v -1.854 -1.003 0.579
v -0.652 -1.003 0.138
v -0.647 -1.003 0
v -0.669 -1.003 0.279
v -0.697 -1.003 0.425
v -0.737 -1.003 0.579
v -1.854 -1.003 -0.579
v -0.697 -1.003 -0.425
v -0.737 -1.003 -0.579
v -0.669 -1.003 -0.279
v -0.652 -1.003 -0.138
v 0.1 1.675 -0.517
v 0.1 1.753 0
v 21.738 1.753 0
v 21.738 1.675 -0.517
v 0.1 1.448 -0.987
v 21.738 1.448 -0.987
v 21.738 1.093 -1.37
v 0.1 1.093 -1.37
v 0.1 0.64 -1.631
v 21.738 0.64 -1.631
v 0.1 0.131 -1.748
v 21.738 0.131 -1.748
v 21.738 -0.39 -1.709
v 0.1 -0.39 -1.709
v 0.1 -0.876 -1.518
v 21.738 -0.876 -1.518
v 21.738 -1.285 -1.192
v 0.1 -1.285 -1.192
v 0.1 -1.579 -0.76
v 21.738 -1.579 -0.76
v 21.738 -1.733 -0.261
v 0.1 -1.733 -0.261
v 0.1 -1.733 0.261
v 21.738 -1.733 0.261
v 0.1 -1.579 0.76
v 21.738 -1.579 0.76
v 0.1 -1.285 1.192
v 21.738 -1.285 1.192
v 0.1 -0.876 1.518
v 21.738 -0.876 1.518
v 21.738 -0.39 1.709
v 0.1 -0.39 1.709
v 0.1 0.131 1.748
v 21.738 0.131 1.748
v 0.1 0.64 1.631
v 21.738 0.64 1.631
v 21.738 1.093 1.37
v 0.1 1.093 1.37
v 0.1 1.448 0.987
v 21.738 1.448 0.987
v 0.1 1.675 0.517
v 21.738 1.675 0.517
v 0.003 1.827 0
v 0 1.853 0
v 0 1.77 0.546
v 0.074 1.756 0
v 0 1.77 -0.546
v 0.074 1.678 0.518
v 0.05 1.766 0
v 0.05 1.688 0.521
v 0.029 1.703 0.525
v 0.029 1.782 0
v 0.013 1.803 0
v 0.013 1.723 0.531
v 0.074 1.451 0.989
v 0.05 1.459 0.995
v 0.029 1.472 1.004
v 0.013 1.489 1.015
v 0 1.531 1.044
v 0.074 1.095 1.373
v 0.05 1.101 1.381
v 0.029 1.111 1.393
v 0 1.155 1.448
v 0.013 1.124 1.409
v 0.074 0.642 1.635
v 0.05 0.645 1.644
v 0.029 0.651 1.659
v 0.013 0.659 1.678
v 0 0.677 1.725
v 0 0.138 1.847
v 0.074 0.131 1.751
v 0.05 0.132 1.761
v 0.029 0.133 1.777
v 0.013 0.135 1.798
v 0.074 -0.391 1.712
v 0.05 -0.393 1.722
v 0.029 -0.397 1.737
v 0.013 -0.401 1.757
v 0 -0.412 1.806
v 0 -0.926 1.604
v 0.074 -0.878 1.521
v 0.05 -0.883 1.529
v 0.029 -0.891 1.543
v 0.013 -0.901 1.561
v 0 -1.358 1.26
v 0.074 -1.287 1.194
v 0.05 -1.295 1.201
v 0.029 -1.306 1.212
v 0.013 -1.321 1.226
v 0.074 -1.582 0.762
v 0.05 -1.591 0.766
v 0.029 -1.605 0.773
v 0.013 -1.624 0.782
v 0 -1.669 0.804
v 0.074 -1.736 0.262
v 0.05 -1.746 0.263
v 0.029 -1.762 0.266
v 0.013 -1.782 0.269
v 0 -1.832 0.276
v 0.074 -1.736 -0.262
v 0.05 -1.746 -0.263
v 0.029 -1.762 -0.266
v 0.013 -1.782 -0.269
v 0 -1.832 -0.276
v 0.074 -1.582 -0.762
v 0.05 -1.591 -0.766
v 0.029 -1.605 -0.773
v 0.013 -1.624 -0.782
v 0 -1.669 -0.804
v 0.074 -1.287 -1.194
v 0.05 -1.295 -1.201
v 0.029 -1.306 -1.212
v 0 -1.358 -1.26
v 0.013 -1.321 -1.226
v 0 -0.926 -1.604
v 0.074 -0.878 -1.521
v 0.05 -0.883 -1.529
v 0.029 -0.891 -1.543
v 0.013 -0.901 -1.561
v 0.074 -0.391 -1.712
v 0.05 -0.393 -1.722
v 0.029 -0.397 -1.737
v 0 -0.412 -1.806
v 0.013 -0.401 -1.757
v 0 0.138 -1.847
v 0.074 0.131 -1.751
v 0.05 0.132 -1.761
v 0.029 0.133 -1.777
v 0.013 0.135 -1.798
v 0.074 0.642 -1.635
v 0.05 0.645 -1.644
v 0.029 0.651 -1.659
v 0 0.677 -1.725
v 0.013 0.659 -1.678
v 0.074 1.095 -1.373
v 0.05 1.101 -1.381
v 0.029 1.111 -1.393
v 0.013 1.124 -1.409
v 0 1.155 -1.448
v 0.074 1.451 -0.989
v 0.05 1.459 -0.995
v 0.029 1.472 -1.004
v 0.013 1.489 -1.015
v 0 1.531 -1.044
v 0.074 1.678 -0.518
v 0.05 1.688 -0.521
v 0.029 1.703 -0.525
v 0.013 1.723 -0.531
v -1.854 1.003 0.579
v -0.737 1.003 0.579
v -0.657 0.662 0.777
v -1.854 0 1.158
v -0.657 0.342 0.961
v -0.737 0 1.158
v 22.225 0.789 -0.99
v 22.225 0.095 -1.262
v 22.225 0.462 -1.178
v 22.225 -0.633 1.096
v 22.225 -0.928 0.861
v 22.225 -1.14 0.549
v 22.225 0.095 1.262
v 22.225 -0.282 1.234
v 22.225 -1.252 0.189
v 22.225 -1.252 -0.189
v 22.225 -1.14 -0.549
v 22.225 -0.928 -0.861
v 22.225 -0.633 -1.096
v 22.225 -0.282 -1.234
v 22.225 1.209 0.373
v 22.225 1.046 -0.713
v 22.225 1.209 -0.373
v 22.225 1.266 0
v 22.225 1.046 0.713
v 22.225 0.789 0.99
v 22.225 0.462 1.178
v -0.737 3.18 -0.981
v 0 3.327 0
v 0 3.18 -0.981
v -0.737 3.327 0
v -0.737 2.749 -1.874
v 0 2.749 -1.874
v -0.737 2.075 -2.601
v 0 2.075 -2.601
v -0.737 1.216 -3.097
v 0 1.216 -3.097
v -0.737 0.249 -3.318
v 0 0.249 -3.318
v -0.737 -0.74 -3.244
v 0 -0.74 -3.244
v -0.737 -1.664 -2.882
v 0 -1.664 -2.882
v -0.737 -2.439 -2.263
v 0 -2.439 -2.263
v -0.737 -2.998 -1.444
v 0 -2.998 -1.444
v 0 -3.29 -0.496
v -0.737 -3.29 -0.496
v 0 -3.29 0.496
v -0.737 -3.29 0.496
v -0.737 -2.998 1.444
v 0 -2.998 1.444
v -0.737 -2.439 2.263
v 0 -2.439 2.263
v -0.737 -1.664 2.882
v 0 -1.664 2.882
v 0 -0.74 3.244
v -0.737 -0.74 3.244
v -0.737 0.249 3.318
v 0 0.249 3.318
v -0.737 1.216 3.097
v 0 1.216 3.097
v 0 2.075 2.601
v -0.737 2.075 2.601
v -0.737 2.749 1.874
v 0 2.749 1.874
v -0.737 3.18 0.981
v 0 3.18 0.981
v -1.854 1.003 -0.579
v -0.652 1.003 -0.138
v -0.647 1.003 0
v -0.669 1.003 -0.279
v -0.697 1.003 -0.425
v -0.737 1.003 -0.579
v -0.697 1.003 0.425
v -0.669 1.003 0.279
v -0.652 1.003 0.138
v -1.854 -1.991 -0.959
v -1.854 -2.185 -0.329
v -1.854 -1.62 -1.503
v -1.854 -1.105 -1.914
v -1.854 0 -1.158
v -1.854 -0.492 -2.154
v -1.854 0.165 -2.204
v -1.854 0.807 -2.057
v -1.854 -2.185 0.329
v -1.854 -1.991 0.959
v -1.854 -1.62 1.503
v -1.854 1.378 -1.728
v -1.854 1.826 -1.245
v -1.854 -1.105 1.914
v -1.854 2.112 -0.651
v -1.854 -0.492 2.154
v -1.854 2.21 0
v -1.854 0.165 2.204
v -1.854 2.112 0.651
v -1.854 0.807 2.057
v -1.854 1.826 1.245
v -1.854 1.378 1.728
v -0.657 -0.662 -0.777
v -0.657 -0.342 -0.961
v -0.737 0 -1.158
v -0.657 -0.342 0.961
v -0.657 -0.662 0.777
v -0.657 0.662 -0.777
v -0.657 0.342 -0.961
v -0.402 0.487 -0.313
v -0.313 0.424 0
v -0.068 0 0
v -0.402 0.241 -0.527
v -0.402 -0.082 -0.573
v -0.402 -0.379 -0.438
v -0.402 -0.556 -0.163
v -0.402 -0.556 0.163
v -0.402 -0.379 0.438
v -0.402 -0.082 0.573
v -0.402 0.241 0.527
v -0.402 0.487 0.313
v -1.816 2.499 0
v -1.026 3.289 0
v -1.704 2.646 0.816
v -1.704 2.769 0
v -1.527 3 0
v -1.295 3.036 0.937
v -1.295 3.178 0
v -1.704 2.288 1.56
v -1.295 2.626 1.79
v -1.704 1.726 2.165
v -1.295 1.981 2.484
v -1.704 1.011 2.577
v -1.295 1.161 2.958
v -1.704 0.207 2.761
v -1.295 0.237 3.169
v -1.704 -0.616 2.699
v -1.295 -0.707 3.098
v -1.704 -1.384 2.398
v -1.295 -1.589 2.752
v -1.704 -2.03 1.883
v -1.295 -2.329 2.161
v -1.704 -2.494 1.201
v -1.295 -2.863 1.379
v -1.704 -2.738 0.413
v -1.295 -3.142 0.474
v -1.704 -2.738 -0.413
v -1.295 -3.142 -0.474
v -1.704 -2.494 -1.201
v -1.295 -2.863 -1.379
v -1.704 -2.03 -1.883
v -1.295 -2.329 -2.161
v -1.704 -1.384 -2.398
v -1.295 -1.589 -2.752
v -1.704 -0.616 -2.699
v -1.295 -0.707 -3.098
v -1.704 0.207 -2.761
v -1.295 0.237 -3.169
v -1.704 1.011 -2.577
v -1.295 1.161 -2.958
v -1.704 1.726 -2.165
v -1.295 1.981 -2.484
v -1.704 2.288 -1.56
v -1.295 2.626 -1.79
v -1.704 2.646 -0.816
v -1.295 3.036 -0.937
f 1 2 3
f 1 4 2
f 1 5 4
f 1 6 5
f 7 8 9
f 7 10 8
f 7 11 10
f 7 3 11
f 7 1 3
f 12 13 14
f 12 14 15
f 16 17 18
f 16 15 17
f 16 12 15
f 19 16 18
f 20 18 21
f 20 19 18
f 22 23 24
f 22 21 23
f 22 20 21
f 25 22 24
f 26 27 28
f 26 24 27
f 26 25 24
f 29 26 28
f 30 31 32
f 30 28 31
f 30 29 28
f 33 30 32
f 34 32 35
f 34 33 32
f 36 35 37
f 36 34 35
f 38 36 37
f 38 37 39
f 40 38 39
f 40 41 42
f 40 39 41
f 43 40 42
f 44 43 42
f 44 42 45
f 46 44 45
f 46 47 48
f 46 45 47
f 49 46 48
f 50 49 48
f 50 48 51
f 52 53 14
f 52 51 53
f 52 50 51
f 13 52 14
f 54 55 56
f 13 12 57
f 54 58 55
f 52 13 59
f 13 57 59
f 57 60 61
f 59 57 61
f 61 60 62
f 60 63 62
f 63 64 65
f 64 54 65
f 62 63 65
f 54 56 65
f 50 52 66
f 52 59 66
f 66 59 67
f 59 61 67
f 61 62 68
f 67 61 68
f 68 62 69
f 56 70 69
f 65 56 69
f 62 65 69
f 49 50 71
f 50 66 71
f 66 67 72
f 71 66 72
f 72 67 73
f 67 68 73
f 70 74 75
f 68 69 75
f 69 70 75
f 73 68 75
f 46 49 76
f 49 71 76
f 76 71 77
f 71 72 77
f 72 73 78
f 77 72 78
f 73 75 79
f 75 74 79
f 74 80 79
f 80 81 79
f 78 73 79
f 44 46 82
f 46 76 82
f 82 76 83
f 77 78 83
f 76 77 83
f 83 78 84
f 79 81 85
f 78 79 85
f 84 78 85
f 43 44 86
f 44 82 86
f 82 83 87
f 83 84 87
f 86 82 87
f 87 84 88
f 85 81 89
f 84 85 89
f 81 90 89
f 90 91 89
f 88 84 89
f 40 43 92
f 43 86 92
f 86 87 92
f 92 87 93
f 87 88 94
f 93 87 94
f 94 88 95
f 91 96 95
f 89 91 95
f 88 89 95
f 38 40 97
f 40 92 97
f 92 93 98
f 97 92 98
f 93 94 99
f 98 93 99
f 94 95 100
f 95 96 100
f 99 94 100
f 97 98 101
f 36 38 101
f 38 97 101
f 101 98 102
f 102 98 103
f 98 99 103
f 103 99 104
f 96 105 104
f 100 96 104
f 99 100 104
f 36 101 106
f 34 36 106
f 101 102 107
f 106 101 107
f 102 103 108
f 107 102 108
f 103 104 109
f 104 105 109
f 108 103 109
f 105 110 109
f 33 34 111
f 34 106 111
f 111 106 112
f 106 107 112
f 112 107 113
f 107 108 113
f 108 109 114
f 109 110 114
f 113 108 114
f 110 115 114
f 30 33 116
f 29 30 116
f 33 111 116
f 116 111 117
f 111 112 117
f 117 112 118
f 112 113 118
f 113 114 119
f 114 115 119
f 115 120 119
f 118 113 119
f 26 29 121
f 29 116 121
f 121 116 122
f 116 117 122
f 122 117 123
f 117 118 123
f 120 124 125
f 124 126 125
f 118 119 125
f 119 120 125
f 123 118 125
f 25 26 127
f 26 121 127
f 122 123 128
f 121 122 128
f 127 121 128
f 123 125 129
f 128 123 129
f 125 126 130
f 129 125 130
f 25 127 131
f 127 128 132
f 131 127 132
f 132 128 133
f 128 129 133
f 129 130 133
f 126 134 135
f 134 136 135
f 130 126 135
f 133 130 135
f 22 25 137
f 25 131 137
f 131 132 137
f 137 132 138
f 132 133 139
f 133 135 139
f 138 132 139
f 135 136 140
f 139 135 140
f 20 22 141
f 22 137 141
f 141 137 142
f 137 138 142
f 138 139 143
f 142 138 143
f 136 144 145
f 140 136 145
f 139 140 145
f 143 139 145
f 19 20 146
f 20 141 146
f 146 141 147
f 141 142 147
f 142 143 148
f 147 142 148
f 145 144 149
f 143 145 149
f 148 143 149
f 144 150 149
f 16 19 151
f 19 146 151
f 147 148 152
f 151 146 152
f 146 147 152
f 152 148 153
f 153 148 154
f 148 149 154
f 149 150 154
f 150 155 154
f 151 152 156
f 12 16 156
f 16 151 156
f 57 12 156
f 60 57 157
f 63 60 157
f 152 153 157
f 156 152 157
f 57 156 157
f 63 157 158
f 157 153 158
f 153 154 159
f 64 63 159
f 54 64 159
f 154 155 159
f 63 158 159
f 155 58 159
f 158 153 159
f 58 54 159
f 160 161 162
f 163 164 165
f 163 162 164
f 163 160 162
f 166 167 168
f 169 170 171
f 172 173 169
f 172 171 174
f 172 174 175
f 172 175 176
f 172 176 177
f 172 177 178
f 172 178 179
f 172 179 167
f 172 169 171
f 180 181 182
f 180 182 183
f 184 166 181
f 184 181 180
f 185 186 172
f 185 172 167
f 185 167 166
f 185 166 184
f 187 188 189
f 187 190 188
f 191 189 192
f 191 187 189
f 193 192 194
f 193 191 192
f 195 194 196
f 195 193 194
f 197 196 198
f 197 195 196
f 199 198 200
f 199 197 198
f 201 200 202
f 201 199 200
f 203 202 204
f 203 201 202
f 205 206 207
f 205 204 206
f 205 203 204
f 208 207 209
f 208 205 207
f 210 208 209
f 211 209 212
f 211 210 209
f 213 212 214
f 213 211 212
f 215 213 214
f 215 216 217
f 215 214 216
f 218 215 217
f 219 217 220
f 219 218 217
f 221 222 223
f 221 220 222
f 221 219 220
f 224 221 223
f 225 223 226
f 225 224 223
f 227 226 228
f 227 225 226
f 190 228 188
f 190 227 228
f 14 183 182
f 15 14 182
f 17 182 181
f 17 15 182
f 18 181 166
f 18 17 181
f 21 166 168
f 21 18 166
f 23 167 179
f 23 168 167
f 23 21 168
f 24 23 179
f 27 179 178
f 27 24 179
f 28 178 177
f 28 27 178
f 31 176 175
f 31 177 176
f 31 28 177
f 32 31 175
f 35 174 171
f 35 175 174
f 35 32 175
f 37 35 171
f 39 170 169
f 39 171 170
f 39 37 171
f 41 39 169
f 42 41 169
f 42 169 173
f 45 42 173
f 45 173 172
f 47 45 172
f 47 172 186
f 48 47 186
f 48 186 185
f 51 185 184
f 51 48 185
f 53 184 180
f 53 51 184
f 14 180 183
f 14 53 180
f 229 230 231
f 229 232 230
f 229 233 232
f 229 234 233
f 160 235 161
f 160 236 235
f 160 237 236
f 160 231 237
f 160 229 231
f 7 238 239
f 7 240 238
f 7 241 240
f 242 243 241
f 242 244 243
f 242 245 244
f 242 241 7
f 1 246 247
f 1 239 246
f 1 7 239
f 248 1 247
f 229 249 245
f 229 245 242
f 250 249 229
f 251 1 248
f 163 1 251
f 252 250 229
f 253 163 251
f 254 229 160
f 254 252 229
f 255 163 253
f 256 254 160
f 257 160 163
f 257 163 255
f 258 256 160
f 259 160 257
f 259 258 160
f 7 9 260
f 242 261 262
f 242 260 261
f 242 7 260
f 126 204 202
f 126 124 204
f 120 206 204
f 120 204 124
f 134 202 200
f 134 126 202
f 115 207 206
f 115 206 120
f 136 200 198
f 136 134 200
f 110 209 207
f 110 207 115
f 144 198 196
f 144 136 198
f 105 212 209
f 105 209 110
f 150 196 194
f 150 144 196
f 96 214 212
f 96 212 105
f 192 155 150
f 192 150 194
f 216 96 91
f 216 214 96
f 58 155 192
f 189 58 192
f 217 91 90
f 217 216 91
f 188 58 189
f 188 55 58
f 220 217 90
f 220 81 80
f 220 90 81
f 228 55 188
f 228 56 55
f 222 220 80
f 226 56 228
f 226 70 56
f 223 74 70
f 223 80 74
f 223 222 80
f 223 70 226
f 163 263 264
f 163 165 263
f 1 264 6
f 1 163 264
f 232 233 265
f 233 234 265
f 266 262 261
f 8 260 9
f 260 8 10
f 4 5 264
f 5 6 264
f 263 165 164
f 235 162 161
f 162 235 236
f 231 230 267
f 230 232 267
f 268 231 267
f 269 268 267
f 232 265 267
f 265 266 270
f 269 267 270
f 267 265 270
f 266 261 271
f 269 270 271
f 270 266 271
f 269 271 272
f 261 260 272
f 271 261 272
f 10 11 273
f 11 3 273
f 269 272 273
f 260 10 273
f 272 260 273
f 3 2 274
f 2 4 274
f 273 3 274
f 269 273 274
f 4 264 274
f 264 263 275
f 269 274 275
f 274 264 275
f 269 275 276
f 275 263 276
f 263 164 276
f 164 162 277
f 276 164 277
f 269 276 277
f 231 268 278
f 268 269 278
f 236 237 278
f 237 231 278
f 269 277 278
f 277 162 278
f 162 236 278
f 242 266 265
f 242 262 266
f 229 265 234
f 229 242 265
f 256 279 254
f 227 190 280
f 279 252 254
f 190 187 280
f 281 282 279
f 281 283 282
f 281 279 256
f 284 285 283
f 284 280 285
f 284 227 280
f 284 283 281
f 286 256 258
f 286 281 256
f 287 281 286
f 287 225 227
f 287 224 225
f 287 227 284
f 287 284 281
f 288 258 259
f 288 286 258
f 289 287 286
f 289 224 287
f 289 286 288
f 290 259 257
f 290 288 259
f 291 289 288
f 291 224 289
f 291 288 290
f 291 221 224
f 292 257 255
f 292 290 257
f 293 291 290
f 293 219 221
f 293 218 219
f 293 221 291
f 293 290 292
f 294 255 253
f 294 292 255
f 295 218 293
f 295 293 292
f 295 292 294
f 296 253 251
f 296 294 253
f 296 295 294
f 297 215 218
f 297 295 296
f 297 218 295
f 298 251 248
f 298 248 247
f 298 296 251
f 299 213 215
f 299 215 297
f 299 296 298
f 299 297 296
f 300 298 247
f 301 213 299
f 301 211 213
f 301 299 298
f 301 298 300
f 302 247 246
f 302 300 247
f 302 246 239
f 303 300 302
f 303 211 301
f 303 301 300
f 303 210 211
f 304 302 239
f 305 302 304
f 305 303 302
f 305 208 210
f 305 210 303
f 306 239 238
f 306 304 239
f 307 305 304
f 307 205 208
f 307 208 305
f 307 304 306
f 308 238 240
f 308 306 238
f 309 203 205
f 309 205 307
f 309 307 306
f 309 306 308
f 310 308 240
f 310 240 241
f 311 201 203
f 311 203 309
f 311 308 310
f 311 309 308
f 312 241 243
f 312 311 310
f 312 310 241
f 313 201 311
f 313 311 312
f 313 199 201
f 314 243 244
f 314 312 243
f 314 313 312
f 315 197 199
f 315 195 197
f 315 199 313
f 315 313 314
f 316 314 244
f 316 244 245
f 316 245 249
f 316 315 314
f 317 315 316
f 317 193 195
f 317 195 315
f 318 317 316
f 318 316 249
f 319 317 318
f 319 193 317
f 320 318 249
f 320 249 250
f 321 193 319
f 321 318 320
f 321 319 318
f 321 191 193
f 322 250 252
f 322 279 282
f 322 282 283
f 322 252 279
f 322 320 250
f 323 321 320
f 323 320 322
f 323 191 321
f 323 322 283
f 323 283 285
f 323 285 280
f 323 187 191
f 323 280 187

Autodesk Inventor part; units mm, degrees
ref_plane "YZ Plane" through (0, 0, 0) normal (1, 0, 0) x (0, 1, 0)
ref_plane "XZ Plane" through (0, 0, 0) normal (0, 1, 0) x (-1, 0, 0)
sketch "Sketch1" plane through (0, 0, 0) normal (0, 0, 1) x (1, 0, 0)
  line L0 (-0.0677, 0) -> (22.225, 0)
  line L1 (22.225, 0) -> (22.225, 1.7526)
  line L2 (22.225, 1.7526) -> (1.651, 1.7526)
  line L3 (1.651, 1.7526) -> (0.0634, 1.7526)
  line L4 (0.0634, 1.7526) -> (0, 1.7526)
  line L5 (0, 1.7526) -> (0, 3.3274)
  line L6 (0, 3.3274) -> (-1.8542, 3.3274)
  line L7 (-1.8542, 3.3274) -> (-1.8542, 1.1585)
  line L8 (-1.8542, 1.1585) -> (-0.7366, 1.1585)
  line L9 (-0.7366, 1.1585) -> (-0.0677, 0)
  line L10 (-6.67, 0) -> (27.0408, 0) projected
  line L11 (0, -0.6655) -> (0, 3.9929) projected
  line L12 (1.651, 1.7526) -> (0, 1.7526) construction
  dimension "d1" = 20.574
  dimension "d2" = 1.5876
  dimension "d3" = 1.8542
  dimension "d4" = 1.1176
  dimension "d5" = 60
  dimension "d6" = 3.5052
  dimension "d7" = 3.5052
  dimension "d8" = 2.317
  dimension "d9" = 6.6548
  dimension "d26" = 22.225
revolve "Body" add sketch "Sketch1" angle 360 about axis through (-0.0677, 0, 0) along (1, 0, 0)
sketch "Sketch2" plane through (-1.8542, 0, 0) normal (-1, 0, 0) x (0, 0, 1)
  circle A0 centre (0, 0) radius 1.1585 projected
  line L0 (0, -4.6584) -> (0, 4.6584) projected
  line L1 (-4.6584, 0) -> (4.6584, 0) projected
  line L2 (1.1585, 0) -> (0.5793, -1.0033)
  line L3 (0.5793, -1.0033) -> (-0.5793, -1.0033)
  line L4 (-0.5793, -1.0033) -> (-1.1585, 0)
  line L5 (-1.1585, 0) -> (-0.5793, 1.0033)
  line L6 (-0.5793, 1.0033) -> (0.5793, 1.0033)
  line L7 (0.5793, 1.0033) -> (1.1585, 0)
extrude "Slot" add sketch "Sketch2" against normal up to next contours L7 A0 | A0 L2 | L6 L0 A0 | A0 L0 L3 | L0 L6 A0 | A0 L3 L0 | L4 A0 | A0 L5
fillet "Fillet1" radius 1.1176 1 edges at (-1.8542, -3.3274, 0)
thread "Thread" size "6-32 UNC" class "2A" standard "ANSI Unified Screw Threads" length 20.574
chamfer "Chamfer1" distance 0.4869 distance2 0.4869 1 edges at (22.225, -1.7526, 0) measured on face at (22.225, 0.4373, -0.3874)
ref_plane "Work Plane1" through (29, 0, 0) normal (0, -1, 0) x (1, 0, 0)
fillet "Fillet2" radius 0.1 1 edges at (0, -1.7526, 0)
equation "\"d1\" = GEL"
equation "\"d3\" = KOH"
equation "\"d4\" = INTI"
equation "\"d6\" = GD"
equation "\"d7\" = BDM"
equation "\"d8\" = 1.1547 * SW"
equation "\"d9\" = KOD"
equation "\"d26\" = NLG"
equation "\"d30\" = R"
equation "\"d17\" = RR"
equation "\"d13\" = GEL"
equation "\"d15\" = -0.5 * SPD + 0.5 * GD"
equation "\"d16\" = GUL"
equation "\"GD\" = NND"
equation "\"NLG\" = 22.225"
equation "\"GEL\" = 20.574"
equation "\"KOD\" = 6.6548"
equation "\"KOH\" = 1.8542"
equation "\"INTI\" = 1.1176"
equation "\"GAL\" = 1.5875"
equation "\"GUL\" = 0.48692"
equation "\"BDM\" = NND"
equation "\"SW\" = 2.0066"
equation "\"RR\" = 1.1176"
equation "\"SPD\" = GD1"
equation "\"R\" = 0.1"
equation "\"KR\" = 4.0132"
equation "\"GD1\" = 2.53137"
equation "\"THREADDIA\" = 3.5052"
equation "\"FAWI\" = 45deg"
equation "\"KOH1\" = 1.1176"
equation "\"NND\" = 3.5052"
equation "\"TOA\" = 30deg"
equation "\"E0\" = 1.155 * SW"
properties part number "Unbrako - 6 x 7/8" material "Steel, Mild"
